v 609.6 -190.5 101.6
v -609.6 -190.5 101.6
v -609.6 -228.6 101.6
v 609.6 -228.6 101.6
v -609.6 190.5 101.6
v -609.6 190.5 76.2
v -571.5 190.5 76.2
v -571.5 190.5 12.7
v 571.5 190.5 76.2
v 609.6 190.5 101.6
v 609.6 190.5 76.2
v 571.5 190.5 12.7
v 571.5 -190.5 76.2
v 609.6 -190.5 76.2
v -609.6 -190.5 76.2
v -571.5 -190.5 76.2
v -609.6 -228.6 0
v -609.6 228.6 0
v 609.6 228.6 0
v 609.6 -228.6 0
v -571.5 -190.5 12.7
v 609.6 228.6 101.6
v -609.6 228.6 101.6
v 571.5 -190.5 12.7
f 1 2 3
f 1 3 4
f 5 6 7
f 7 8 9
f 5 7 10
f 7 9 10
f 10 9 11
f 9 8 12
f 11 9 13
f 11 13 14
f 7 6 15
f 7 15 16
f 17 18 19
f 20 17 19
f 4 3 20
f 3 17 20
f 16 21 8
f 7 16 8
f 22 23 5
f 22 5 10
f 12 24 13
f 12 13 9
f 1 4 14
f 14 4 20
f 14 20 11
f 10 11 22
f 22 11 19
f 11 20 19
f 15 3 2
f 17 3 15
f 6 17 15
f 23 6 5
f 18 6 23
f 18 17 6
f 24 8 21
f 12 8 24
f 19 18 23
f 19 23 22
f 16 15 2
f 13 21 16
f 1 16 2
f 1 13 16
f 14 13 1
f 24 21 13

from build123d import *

# Parameters (mm, degrees)
F0_W     = 1219.2
F0_H     = 457.2
F1_DEPTH = 12.7
F2_W     = 1219.2
F2_H     = 38.1
F3_DEPTH = 88.9
F4_W     = 38.1
F4_H     = 381
F5_DEPTH = 63.5


# Not quite as in the source:
# - a length typed as a fraction of an inch, garbled in the dataset ("3 / 203.2 mm" for 3/8 in), is restored


with BuildPart() as f1:
    # F0 (on Top) → F1 (new body)
    with BuildSketch(Plane.XY):
        Rectangle(F0_W, F0_H)
    extrude(amount=F1_DEPTH)

    # F2 (on face) → F3 (join)
    with BuildSketch(Plane.XY.offset(12.7)):
        with Locations((0, -209.55)):
            Rectangle(F2_W, F2_H)
        with Locations((0, 209.55)):
            Rectangle(F2_W, F2_H)
    extrude(amount=F3_DEPTH)

    # F4 (on face) → F5 (join)
    with BuildSketch(Plane.XY.offset(12.7)):
        with Locations((-590.55, 0)):
            Rectangle(F4_W, F4_H)
        with Locations((590.55, 0)):
            Rectangle(F4_W, F4_H)
    extrude(amount=F5_DEPTH)


solid = f1.part
